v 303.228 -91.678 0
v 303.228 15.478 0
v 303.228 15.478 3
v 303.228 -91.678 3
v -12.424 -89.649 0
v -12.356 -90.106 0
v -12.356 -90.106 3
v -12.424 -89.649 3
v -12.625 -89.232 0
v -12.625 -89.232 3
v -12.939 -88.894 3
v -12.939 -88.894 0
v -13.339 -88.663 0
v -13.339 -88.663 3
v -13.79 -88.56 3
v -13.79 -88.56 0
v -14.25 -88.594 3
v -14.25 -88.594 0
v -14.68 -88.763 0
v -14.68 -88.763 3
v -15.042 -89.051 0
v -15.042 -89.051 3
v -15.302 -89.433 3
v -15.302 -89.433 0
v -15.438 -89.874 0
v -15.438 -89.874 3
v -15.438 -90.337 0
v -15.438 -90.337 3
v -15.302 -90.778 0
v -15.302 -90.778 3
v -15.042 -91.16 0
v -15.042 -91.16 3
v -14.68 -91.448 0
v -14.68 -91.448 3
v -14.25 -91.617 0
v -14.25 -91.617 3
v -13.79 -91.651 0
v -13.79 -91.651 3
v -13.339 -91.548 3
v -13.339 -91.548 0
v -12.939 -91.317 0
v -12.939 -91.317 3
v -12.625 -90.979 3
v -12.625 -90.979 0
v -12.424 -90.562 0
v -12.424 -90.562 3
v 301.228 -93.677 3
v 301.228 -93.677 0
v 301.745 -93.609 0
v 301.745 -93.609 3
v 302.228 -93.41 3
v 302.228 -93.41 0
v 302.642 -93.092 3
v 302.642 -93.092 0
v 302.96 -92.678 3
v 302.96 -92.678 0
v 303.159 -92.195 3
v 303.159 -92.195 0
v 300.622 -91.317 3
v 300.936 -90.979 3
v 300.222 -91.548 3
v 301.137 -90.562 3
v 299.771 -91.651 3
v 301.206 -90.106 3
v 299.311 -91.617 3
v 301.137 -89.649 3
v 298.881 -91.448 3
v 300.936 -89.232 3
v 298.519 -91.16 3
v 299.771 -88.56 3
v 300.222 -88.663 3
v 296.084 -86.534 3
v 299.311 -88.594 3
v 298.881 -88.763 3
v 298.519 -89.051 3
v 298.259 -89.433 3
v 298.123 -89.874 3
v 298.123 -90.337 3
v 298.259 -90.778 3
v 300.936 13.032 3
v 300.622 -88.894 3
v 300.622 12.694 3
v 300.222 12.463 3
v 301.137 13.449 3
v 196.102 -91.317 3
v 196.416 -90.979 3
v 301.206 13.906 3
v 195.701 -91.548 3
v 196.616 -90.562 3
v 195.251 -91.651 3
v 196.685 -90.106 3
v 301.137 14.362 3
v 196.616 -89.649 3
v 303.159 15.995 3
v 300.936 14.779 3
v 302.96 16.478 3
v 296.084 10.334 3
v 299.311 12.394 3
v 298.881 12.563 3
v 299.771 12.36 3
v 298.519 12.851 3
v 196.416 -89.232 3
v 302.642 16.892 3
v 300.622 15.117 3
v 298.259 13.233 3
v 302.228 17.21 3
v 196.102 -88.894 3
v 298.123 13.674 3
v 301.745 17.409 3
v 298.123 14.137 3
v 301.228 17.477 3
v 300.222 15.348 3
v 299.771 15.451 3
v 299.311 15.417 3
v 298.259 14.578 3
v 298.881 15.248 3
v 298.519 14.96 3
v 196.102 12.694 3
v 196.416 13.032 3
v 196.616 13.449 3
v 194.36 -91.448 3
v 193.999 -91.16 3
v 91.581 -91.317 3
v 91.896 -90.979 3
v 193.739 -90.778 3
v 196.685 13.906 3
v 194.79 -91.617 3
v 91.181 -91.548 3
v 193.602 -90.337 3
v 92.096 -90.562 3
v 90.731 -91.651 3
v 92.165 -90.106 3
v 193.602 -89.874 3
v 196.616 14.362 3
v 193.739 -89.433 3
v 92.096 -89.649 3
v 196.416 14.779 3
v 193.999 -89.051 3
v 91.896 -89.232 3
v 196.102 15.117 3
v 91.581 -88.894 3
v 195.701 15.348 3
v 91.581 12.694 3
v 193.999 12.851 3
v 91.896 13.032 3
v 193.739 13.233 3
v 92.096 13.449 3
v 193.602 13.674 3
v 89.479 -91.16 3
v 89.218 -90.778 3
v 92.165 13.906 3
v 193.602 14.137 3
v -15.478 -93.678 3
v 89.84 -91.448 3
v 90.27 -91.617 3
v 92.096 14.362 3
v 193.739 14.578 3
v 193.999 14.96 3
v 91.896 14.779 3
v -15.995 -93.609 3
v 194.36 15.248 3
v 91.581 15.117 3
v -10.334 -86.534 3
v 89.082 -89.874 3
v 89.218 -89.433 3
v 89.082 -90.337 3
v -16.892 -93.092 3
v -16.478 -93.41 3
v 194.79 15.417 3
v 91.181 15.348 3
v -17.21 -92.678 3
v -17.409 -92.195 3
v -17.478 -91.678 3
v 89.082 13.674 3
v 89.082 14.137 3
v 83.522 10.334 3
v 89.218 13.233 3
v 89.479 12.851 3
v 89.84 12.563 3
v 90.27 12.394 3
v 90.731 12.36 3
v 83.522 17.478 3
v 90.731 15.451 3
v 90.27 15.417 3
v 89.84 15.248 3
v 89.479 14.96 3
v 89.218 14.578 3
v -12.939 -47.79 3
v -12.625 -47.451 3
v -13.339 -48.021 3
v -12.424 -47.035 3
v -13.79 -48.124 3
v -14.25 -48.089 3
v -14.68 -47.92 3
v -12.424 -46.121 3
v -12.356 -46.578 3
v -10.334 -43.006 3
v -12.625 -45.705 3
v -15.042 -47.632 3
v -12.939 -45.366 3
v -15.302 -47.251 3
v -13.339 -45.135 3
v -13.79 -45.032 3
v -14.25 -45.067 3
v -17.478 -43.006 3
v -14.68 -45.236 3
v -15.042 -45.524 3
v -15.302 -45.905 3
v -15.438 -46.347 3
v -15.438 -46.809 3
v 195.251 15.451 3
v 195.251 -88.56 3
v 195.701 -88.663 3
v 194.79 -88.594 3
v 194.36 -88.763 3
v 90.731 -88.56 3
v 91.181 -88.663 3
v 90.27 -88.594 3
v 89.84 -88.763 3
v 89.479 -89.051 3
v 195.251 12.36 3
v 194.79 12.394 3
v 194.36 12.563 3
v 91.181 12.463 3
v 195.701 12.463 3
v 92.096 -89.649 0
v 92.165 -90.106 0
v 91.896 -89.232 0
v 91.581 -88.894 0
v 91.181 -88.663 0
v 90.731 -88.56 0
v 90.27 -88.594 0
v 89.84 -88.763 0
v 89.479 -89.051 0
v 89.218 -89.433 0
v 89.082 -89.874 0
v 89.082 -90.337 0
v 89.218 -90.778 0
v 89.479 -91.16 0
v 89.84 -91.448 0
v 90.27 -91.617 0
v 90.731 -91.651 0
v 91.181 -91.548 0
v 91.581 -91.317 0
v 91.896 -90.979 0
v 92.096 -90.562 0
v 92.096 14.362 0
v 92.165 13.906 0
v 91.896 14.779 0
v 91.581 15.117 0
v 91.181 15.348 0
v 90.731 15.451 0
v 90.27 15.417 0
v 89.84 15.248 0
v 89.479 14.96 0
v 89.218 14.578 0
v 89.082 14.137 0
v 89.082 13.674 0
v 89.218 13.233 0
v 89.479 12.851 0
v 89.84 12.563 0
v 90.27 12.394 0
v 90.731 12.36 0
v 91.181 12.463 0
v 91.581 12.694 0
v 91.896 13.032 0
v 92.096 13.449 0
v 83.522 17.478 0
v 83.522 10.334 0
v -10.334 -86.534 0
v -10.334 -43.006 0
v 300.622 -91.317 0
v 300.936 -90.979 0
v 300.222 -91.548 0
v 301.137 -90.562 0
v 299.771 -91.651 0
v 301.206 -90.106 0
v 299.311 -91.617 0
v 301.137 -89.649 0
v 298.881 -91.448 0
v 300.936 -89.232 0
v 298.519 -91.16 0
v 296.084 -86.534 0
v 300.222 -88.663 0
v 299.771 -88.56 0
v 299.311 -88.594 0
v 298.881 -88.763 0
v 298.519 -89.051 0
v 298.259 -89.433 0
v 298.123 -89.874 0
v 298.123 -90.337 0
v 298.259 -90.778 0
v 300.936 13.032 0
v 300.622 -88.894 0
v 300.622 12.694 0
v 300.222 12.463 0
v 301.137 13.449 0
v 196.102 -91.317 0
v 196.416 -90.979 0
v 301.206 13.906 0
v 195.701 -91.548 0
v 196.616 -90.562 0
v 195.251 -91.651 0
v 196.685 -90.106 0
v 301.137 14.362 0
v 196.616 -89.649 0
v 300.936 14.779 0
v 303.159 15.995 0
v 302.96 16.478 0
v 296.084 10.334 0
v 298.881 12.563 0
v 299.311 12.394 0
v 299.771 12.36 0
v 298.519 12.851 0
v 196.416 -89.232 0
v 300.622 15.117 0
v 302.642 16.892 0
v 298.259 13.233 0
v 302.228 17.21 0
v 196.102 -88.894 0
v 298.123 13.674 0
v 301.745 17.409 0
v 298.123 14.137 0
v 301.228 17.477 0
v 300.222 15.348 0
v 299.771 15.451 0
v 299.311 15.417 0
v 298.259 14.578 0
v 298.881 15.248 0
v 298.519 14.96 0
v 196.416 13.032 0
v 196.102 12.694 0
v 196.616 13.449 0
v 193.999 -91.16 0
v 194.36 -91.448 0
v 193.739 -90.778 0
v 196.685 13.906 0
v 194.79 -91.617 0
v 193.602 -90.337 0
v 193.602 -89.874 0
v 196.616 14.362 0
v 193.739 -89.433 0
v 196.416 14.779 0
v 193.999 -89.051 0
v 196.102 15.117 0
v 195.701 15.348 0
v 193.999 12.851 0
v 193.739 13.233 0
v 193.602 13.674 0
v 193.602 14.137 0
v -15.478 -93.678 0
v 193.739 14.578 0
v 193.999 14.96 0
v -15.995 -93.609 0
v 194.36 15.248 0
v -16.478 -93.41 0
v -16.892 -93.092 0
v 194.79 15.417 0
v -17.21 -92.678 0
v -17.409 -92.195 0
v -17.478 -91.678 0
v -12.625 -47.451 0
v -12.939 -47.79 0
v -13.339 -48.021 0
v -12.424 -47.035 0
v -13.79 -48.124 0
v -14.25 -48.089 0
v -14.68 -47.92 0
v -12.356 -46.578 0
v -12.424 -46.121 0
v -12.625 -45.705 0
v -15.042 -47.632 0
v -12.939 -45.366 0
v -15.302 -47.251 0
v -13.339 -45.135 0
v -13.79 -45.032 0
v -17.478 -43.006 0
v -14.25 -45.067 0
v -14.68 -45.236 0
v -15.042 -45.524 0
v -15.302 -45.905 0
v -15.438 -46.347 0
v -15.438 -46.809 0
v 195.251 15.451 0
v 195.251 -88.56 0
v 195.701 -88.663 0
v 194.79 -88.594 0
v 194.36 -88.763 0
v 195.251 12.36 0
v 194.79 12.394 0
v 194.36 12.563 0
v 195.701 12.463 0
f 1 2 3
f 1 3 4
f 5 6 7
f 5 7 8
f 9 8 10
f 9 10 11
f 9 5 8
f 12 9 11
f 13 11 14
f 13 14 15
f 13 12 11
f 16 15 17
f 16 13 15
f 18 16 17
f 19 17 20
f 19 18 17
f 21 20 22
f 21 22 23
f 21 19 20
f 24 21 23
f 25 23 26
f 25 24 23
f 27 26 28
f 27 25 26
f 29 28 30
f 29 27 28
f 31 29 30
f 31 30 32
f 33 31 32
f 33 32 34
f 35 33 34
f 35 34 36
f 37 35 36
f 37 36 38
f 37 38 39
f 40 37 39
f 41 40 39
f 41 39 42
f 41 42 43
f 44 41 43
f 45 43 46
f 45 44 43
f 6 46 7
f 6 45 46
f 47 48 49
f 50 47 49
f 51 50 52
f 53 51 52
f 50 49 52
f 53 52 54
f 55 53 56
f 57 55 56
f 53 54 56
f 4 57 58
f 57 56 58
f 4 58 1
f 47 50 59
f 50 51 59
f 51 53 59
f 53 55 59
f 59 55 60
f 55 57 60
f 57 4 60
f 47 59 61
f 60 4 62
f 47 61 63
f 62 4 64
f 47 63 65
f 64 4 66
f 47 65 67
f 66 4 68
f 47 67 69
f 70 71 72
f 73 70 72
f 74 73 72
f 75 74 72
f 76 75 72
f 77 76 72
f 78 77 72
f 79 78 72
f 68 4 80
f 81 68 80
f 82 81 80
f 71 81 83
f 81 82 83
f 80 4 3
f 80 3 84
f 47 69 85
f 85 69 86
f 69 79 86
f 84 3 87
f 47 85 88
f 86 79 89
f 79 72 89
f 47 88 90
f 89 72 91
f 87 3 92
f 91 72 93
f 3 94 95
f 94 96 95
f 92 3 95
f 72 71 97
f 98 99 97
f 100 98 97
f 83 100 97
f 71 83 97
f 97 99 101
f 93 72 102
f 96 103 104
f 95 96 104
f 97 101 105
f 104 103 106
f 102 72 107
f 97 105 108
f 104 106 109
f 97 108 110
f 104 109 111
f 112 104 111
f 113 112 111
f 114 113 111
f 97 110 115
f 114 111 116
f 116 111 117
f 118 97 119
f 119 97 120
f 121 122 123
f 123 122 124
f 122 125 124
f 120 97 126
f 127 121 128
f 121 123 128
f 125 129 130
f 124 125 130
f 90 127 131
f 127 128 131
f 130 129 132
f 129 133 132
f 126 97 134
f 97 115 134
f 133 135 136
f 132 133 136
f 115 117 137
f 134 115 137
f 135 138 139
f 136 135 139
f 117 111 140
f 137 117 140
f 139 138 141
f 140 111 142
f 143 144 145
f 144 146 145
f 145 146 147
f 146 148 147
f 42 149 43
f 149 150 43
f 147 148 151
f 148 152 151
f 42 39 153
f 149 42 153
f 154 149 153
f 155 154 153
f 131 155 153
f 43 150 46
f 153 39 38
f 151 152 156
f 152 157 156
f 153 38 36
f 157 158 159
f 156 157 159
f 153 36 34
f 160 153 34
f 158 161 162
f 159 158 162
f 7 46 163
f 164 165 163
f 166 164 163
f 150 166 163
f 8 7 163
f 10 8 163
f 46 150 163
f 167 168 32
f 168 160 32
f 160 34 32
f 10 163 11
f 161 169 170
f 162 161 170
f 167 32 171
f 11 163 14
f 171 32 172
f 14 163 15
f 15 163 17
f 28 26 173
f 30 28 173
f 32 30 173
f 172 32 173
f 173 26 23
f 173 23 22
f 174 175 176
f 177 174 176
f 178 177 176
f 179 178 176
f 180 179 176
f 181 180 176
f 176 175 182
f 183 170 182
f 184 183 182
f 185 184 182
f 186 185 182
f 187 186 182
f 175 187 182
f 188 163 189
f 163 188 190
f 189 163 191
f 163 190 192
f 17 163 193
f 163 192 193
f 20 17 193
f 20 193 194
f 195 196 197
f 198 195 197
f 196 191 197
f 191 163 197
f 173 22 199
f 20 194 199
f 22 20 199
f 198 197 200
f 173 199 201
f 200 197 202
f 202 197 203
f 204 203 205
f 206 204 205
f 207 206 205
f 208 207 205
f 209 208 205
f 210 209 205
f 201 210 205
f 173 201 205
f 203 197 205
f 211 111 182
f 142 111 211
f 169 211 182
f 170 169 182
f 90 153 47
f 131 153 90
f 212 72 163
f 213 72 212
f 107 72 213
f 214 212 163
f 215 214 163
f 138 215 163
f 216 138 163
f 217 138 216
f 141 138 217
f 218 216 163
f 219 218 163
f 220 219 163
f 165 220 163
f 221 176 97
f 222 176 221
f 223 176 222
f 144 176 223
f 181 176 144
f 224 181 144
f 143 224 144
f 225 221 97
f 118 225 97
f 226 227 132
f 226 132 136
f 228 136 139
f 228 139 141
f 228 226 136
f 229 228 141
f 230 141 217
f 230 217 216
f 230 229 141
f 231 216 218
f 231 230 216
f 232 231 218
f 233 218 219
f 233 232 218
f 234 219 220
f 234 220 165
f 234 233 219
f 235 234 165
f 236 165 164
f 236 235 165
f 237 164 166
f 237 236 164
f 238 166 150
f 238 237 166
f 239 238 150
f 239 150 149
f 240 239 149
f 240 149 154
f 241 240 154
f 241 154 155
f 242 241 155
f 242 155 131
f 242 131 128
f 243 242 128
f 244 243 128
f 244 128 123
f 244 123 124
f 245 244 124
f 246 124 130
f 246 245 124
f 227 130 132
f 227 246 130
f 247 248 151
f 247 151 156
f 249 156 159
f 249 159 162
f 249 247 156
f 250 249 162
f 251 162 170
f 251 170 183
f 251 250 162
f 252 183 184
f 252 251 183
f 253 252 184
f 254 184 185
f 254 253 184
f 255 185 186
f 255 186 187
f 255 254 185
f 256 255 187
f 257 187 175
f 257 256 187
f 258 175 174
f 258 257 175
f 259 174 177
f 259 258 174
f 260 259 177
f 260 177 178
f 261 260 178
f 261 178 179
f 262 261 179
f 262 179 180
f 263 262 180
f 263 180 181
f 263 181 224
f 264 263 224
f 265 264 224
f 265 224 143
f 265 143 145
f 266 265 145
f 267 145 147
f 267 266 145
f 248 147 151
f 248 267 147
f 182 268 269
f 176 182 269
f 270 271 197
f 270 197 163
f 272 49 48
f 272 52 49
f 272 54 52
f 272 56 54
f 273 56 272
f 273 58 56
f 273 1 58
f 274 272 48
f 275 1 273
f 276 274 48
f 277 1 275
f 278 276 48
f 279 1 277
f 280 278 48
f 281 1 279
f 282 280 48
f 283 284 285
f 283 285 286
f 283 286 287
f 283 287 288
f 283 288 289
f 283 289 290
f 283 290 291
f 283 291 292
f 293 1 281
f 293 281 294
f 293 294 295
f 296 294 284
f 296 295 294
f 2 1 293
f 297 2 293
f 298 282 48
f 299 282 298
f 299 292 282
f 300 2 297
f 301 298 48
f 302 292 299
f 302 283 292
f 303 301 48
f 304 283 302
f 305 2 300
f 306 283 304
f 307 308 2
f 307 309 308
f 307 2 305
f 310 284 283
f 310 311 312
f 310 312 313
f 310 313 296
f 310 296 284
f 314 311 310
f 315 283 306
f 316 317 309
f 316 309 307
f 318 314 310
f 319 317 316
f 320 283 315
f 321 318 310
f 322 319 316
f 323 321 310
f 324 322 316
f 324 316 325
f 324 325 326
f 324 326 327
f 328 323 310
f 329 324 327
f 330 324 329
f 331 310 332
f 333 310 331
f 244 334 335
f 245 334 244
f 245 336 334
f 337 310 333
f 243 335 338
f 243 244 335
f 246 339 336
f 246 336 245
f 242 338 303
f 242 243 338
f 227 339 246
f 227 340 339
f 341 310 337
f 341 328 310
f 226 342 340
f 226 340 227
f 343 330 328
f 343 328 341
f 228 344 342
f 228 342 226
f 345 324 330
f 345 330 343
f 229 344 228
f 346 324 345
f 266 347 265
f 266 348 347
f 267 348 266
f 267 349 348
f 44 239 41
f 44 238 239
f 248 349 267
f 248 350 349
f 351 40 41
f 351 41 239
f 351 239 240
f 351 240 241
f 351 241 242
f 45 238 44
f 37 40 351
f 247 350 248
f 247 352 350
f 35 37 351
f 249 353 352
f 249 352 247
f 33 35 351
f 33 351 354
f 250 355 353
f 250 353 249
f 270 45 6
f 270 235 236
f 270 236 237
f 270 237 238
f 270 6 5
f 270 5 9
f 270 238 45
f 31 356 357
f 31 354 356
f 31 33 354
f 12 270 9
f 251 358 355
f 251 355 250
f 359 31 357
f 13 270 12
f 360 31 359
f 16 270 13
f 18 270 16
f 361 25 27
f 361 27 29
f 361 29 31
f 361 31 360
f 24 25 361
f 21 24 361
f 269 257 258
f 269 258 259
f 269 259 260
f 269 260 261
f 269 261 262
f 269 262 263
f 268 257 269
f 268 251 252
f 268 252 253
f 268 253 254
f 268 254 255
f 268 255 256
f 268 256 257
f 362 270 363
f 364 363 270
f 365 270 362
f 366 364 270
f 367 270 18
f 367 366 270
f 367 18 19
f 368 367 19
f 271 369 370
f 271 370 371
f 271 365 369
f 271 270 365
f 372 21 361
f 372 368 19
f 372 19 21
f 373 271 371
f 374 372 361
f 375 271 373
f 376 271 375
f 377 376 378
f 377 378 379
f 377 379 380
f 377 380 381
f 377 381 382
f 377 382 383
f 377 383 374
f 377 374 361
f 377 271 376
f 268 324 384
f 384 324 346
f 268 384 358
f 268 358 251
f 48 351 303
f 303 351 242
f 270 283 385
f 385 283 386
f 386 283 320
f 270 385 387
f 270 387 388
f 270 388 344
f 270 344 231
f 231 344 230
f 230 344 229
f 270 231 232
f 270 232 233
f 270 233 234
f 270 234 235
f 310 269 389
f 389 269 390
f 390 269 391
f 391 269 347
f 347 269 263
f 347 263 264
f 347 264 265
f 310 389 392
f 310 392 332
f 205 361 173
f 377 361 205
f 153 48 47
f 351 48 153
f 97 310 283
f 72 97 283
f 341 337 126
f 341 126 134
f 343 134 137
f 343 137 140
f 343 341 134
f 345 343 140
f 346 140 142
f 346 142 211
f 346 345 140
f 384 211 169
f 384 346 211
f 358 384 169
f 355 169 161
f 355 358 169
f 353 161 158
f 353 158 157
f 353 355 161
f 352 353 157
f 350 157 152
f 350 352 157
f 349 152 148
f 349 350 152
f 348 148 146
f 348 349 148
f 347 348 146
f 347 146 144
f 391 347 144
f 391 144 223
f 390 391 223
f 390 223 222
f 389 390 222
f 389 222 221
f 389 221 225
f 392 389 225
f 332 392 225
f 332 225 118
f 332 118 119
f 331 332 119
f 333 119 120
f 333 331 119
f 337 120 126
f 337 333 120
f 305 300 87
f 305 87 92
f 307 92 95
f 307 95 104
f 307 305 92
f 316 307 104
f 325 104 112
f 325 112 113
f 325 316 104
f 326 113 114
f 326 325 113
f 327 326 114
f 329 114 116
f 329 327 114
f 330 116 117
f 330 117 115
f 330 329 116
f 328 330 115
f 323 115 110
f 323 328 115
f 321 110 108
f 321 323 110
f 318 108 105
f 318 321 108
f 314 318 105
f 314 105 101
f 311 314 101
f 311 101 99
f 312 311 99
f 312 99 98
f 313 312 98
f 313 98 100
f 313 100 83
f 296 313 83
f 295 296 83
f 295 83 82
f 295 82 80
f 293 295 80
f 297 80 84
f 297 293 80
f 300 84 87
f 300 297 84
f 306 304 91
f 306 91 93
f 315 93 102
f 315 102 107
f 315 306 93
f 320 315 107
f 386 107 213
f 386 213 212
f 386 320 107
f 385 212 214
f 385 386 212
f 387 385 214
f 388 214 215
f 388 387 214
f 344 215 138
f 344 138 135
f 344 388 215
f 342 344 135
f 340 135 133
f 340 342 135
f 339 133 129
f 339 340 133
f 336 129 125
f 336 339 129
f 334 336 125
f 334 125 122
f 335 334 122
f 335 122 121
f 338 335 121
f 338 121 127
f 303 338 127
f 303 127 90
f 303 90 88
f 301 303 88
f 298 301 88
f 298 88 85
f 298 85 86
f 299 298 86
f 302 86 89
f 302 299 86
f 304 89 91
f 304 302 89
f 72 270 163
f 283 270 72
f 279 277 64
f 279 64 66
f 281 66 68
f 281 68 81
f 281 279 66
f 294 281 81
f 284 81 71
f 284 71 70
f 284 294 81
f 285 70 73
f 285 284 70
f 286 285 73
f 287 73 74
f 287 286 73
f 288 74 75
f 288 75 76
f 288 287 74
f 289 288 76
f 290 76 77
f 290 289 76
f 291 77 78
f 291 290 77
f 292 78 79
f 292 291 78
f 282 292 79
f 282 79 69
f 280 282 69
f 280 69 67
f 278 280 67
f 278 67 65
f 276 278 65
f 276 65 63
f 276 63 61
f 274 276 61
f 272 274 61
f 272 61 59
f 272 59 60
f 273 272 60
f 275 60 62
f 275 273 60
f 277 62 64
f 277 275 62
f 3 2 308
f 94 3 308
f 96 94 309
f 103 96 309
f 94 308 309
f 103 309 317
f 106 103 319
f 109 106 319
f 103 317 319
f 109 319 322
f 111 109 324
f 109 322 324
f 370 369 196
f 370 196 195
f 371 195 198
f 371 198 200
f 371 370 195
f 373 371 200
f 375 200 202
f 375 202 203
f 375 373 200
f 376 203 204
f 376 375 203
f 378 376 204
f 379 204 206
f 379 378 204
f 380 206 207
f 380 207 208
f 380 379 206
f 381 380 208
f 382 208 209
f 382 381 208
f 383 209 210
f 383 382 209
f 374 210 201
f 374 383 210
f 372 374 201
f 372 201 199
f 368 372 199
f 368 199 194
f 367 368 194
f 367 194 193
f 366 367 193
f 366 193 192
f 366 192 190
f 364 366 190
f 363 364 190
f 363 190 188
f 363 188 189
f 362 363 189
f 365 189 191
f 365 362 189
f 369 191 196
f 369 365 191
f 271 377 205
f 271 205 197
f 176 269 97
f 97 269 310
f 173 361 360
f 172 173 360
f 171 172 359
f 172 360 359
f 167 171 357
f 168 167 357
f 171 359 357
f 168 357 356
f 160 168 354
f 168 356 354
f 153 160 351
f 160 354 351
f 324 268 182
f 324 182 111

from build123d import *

# Parameters (mm, degrees)
SKETCH_R  = 1.55
PAD_DEPTH = 3


with BuildPart() as part:
    # Sketch → Pad (new body)
    with BuildSketch(Plane.XY):
        with BuildLine():
            Line((83.5225, 17.4775), (301.2275, 17.4775))
            ThreePointArc((303.2275, 15.4775), (302.641714, 16.891714), (301.2275, 17.4775))
            Line((303.2275, 15.4775), (303.2275, -91.6775))
            ThreePointArc((301.2275, -93.6775), (302.641714, -93.091714), (303.2275, -91.6775))
            Line((301.2275, -93.6775), (-15.4775, -93.6775))
            ThreePointArc((-17.4775, -91.6775), (-16.891714, -93.091714), (-15.4775, -93.6775))
            Line((-17.4775, -91.6775), (-17.4775, -43.006))
            Line((-17.4775, -43.006), (-10.3335, -43.006))
            Line((-10.3335, -43.006), (-10.3335, -86.5335))
            Line((-10.3335, -86.5335), (296.0835, -86.5335))
            Line((296.0835, 10.3335), (296.0835, -86.5335))
            Line((83.5225, 10.3335), (296.0835, 10.3335))
            Line((83.5225, 17.4775), (83.5225, 10.3335))
        make_face()
        with Locations((-13.9055, -90.1055)):
            Circle(SKETCH_R, mode=Mode.SUBTRACT)
        with Locations((195.135167, -90.1055)):
            Circle(SKETCH_R, mode=Mode.SUBTRACT)
        with Locations((299.6555, -90.1055)):
            Circle(SKETCH_R, mode=Mode.SUBTRACT)
        with Locations((90.614833, -90.1055)):
            Circle(SKETCH_R, mode=Mode.SUBTRACT)
        with Locations((90.614833, 13.9055)):
            Circle(SKETCH_R, mode=Mode.SUBTRACT)
        with Locations((195.135167, 13.9055)):
            Circle(SKETCH_R, mode=Mode.SUBTRACT)
        with Locations((299.6555, 13.9055)):
            Circle(SKETCH_R, mode=Mode.SUBTRACT)
        with Locations((-13.9055, -46.578)):
            Circle(SKETCH_R, mode=Mode.SUBTRACT)
    extrude(amount=PAD_DEPTH)


solid = part.part
